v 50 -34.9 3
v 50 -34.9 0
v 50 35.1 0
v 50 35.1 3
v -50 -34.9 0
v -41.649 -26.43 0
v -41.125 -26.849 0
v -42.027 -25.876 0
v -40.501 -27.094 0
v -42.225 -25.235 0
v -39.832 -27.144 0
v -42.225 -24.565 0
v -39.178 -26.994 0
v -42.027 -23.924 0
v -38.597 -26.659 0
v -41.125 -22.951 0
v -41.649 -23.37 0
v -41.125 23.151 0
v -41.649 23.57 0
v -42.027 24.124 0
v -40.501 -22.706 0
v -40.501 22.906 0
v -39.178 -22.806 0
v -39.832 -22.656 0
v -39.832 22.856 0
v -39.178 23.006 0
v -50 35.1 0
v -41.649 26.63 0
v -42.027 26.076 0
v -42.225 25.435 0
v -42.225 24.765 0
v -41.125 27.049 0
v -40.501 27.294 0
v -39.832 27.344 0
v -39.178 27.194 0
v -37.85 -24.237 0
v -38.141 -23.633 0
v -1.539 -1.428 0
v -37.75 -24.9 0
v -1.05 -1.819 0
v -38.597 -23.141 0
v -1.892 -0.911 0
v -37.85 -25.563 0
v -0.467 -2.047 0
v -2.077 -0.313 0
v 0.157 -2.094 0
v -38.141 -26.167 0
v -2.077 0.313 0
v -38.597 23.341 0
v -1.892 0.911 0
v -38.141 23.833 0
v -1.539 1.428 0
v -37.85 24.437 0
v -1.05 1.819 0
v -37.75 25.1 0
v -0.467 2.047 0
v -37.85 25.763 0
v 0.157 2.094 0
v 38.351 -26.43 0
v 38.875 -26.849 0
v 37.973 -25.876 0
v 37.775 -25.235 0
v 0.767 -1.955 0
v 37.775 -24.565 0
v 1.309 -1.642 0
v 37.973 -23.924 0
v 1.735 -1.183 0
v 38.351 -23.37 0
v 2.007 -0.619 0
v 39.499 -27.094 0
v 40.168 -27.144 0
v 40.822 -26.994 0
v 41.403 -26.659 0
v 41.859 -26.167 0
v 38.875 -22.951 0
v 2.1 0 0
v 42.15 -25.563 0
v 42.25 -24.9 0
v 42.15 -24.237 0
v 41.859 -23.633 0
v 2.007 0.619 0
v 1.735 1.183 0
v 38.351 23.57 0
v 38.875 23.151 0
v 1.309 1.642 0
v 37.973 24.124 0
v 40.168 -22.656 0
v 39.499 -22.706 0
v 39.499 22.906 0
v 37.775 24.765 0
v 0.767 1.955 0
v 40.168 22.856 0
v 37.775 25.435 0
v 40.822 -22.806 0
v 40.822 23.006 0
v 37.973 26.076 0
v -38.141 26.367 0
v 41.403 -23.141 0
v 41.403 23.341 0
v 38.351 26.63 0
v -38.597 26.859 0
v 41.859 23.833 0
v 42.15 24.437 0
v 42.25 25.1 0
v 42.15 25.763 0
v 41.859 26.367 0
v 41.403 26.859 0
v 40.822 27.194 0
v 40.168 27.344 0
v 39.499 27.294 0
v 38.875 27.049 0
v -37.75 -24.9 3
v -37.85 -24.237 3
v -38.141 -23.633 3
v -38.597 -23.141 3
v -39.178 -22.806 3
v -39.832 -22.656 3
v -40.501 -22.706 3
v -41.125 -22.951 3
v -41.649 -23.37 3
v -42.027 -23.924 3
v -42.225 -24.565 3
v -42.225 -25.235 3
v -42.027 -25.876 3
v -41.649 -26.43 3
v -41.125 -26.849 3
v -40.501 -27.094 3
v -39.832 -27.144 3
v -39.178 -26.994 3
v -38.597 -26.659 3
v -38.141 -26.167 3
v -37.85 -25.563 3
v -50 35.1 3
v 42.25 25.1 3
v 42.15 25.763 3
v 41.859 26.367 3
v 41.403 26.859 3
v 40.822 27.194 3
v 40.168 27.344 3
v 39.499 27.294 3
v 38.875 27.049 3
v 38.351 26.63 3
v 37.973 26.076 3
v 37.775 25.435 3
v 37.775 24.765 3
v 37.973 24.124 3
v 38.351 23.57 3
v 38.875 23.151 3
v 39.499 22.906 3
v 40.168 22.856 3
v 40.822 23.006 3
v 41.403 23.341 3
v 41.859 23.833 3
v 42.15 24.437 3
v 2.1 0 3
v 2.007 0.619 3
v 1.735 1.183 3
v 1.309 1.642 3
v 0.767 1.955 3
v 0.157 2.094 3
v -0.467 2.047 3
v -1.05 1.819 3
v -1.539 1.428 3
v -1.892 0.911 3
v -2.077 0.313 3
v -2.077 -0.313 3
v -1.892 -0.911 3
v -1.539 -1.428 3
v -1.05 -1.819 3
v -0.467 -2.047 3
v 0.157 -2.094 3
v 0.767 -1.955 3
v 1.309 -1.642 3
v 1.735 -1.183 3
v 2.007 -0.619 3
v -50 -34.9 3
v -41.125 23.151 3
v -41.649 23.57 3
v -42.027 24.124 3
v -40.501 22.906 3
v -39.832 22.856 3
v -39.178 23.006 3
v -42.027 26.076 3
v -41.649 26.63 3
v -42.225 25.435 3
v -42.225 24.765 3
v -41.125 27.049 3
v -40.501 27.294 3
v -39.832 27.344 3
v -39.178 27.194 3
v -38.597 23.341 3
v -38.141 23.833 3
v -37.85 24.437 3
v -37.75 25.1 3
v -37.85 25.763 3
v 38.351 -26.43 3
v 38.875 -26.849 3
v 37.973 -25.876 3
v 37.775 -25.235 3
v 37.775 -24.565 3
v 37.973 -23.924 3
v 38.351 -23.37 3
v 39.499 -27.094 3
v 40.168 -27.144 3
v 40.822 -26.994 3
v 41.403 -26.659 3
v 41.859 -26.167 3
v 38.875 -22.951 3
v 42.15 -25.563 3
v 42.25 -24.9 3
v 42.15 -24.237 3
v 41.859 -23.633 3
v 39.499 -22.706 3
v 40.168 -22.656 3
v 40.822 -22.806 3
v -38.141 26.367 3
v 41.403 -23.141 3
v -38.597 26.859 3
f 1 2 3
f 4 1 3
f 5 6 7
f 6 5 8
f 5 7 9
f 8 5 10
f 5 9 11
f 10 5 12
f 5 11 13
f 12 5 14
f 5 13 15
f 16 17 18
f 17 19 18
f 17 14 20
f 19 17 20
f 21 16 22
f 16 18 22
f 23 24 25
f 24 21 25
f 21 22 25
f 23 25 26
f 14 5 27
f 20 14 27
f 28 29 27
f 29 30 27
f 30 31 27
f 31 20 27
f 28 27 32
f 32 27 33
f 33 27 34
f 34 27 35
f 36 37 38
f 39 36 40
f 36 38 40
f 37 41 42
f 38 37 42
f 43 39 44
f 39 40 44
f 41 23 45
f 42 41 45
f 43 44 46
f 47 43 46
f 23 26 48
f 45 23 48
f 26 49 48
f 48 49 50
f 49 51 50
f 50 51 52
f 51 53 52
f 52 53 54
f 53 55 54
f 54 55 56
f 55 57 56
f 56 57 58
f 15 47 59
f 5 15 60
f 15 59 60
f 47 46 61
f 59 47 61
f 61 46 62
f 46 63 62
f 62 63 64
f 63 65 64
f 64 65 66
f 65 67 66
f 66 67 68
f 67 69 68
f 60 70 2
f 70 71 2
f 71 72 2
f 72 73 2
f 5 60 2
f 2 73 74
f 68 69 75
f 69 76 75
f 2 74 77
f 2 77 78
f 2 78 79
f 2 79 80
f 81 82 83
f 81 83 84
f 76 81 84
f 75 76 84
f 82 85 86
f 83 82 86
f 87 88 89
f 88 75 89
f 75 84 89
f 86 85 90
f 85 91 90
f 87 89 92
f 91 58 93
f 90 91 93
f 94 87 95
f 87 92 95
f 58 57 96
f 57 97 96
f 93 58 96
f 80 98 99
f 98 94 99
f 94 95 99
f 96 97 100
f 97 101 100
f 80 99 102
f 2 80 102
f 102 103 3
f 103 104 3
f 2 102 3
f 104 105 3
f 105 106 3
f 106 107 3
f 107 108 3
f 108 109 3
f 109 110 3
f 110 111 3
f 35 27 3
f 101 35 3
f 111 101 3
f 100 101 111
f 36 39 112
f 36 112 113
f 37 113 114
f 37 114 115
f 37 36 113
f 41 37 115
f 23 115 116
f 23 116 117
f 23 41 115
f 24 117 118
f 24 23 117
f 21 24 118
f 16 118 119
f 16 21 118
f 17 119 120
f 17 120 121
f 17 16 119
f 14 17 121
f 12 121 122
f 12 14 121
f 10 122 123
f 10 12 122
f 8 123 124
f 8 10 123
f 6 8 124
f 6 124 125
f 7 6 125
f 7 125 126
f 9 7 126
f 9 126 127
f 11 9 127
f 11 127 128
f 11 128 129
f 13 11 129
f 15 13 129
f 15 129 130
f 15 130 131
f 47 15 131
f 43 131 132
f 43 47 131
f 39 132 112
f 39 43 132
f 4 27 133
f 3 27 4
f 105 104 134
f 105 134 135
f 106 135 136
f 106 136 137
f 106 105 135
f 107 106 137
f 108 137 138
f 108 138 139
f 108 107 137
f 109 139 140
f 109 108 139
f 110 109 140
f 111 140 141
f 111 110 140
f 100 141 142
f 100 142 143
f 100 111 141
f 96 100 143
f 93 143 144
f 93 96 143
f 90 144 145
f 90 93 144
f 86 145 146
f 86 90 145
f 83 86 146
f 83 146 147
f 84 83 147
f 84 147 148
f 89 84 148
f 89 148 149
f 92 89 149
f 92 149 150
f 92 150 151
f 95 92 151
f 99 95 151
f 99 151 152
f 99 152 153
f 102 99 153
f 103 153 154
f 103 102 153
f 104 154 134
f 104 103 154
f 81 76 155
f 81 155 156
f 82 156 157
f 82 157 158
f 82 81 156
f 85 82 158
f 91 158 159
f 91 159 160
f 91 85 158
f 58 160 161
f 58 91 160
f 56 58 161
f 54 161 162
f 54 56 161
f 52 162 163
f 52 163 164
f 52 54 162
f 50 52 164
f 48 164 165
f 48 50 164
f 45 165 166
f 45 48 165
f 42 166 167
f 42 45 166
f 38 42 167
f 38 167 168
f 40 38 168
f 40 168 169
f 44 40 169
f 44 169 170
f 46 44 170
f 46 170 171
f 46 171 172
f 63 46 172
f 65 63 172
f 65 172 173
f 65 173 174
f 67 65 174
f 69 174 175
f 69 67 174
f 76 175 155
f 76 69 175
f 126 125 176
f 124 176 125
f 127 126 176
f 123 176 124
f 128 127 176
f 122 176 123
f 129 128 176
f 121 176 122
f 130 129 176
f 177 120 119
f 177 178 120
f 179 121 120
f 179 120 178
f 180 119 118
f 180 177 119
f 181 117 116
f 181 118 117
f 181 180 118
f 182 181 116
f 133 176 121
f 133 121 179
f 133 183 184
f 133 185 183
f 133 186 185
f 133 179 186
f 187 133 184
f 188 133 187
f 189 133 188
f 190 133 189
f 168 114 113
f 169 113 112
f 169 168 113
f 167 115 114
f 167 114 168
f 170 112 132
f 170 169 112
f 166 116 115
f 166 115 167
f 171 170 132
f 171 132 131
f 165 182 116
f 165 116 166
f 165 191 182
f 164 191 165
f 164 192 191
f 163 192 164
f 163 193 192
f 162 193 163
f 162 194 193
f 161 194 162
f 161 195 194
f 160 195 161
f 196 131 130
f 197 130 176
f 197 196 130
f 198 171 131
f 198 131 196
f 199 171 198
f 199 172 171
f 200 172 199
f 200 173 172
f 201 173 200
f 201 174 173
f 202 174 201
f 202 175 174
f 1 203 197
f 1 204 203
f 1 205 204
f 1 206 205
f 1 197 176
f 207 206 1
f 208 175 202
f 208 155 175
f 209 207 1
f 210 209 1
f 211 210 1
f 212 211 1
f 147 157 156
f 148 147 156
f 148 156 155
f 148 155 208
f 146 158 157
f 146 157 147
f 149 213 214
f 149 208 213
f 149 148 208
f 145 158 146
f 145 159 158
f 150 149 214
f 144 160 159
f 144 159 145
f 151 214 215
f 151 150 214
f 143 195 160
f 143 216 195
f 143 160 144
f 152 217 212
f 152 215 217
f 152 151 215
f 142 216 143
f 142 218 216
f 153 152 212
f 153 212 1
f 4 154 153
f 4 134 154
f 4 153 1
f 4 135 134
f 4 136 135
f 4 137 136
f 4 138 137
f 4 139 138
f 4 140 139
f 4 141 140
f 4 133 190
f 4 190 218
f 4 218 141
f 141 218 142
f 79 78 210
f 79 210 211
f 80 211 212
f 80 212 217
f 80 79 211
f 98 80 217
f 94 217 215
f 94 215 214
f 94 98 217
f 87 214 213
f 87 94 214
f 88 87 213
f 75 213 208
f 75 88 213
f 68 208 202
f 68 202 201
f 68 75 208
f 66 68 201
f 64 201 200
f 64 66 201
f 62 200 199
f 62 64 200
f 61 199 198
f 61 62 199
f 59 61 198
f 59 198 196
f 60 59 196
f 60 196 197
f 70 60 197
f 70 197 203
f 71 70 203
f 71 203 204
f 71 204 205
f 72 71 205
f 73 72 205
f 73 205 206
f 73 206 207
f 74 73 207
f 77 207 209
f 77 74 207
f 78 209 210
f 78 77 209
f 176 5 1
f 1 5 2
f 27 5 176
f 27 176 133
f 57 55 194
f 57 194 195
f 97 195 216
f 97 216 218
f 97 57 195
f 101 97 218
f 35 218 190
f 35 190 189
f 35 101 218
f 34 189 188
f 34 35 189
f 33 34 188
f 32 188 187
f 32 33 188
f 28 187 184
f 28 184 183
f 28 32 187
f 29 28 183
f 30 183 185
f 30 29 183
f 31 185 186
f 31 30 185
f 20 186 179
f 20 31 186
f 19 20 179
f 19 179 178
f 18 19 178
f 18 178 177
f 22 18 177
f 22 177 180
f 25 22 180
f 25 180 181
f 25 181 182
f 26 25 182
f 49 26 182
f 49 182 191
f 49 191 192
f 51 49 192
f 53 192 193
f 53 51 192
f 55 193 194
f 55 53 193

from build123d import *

# Parameters (mm, degrees)
F0_W     = 100
F0_H     = 70
F0_R     = 2.25
F0_R_2   = 2.1
F1_DEPTH = 3


# Not quite as in the source:
# - a feature names something its author has since deleted; it is built from what else it names


with BuildPart() as f1:
    # F0 (on Top) → F1 (new body)
    with BuildSketch(Plane.XY):
        with Locations((-7.451e-07, 0.0999978185)):
            Rectangle(F0_W, F0_H)
        with Locations((-40.0000007451, -24.9000021815)):
            Circle(F0_R, mode=Mode.SUBTRACT)
        with Locations((40.0000007451, -24.9000021815)):
            Circle(F0_R, mode=Mode.SUBTRACT)
        Circle(F0_R_2, mode=Mode.SUBTRACT)
        with Locations((-40.0000007451, 25.0999978185)):
            Circle(F0_R, mode=Mode.SUBTRACT)
        with Locations((40.0000007451, 25.0999978185)):
            Circle(F0_R, mode=Mode.SUBTRACT)
    extrude(amount=F1_DEPTH)


solid = f1.part
